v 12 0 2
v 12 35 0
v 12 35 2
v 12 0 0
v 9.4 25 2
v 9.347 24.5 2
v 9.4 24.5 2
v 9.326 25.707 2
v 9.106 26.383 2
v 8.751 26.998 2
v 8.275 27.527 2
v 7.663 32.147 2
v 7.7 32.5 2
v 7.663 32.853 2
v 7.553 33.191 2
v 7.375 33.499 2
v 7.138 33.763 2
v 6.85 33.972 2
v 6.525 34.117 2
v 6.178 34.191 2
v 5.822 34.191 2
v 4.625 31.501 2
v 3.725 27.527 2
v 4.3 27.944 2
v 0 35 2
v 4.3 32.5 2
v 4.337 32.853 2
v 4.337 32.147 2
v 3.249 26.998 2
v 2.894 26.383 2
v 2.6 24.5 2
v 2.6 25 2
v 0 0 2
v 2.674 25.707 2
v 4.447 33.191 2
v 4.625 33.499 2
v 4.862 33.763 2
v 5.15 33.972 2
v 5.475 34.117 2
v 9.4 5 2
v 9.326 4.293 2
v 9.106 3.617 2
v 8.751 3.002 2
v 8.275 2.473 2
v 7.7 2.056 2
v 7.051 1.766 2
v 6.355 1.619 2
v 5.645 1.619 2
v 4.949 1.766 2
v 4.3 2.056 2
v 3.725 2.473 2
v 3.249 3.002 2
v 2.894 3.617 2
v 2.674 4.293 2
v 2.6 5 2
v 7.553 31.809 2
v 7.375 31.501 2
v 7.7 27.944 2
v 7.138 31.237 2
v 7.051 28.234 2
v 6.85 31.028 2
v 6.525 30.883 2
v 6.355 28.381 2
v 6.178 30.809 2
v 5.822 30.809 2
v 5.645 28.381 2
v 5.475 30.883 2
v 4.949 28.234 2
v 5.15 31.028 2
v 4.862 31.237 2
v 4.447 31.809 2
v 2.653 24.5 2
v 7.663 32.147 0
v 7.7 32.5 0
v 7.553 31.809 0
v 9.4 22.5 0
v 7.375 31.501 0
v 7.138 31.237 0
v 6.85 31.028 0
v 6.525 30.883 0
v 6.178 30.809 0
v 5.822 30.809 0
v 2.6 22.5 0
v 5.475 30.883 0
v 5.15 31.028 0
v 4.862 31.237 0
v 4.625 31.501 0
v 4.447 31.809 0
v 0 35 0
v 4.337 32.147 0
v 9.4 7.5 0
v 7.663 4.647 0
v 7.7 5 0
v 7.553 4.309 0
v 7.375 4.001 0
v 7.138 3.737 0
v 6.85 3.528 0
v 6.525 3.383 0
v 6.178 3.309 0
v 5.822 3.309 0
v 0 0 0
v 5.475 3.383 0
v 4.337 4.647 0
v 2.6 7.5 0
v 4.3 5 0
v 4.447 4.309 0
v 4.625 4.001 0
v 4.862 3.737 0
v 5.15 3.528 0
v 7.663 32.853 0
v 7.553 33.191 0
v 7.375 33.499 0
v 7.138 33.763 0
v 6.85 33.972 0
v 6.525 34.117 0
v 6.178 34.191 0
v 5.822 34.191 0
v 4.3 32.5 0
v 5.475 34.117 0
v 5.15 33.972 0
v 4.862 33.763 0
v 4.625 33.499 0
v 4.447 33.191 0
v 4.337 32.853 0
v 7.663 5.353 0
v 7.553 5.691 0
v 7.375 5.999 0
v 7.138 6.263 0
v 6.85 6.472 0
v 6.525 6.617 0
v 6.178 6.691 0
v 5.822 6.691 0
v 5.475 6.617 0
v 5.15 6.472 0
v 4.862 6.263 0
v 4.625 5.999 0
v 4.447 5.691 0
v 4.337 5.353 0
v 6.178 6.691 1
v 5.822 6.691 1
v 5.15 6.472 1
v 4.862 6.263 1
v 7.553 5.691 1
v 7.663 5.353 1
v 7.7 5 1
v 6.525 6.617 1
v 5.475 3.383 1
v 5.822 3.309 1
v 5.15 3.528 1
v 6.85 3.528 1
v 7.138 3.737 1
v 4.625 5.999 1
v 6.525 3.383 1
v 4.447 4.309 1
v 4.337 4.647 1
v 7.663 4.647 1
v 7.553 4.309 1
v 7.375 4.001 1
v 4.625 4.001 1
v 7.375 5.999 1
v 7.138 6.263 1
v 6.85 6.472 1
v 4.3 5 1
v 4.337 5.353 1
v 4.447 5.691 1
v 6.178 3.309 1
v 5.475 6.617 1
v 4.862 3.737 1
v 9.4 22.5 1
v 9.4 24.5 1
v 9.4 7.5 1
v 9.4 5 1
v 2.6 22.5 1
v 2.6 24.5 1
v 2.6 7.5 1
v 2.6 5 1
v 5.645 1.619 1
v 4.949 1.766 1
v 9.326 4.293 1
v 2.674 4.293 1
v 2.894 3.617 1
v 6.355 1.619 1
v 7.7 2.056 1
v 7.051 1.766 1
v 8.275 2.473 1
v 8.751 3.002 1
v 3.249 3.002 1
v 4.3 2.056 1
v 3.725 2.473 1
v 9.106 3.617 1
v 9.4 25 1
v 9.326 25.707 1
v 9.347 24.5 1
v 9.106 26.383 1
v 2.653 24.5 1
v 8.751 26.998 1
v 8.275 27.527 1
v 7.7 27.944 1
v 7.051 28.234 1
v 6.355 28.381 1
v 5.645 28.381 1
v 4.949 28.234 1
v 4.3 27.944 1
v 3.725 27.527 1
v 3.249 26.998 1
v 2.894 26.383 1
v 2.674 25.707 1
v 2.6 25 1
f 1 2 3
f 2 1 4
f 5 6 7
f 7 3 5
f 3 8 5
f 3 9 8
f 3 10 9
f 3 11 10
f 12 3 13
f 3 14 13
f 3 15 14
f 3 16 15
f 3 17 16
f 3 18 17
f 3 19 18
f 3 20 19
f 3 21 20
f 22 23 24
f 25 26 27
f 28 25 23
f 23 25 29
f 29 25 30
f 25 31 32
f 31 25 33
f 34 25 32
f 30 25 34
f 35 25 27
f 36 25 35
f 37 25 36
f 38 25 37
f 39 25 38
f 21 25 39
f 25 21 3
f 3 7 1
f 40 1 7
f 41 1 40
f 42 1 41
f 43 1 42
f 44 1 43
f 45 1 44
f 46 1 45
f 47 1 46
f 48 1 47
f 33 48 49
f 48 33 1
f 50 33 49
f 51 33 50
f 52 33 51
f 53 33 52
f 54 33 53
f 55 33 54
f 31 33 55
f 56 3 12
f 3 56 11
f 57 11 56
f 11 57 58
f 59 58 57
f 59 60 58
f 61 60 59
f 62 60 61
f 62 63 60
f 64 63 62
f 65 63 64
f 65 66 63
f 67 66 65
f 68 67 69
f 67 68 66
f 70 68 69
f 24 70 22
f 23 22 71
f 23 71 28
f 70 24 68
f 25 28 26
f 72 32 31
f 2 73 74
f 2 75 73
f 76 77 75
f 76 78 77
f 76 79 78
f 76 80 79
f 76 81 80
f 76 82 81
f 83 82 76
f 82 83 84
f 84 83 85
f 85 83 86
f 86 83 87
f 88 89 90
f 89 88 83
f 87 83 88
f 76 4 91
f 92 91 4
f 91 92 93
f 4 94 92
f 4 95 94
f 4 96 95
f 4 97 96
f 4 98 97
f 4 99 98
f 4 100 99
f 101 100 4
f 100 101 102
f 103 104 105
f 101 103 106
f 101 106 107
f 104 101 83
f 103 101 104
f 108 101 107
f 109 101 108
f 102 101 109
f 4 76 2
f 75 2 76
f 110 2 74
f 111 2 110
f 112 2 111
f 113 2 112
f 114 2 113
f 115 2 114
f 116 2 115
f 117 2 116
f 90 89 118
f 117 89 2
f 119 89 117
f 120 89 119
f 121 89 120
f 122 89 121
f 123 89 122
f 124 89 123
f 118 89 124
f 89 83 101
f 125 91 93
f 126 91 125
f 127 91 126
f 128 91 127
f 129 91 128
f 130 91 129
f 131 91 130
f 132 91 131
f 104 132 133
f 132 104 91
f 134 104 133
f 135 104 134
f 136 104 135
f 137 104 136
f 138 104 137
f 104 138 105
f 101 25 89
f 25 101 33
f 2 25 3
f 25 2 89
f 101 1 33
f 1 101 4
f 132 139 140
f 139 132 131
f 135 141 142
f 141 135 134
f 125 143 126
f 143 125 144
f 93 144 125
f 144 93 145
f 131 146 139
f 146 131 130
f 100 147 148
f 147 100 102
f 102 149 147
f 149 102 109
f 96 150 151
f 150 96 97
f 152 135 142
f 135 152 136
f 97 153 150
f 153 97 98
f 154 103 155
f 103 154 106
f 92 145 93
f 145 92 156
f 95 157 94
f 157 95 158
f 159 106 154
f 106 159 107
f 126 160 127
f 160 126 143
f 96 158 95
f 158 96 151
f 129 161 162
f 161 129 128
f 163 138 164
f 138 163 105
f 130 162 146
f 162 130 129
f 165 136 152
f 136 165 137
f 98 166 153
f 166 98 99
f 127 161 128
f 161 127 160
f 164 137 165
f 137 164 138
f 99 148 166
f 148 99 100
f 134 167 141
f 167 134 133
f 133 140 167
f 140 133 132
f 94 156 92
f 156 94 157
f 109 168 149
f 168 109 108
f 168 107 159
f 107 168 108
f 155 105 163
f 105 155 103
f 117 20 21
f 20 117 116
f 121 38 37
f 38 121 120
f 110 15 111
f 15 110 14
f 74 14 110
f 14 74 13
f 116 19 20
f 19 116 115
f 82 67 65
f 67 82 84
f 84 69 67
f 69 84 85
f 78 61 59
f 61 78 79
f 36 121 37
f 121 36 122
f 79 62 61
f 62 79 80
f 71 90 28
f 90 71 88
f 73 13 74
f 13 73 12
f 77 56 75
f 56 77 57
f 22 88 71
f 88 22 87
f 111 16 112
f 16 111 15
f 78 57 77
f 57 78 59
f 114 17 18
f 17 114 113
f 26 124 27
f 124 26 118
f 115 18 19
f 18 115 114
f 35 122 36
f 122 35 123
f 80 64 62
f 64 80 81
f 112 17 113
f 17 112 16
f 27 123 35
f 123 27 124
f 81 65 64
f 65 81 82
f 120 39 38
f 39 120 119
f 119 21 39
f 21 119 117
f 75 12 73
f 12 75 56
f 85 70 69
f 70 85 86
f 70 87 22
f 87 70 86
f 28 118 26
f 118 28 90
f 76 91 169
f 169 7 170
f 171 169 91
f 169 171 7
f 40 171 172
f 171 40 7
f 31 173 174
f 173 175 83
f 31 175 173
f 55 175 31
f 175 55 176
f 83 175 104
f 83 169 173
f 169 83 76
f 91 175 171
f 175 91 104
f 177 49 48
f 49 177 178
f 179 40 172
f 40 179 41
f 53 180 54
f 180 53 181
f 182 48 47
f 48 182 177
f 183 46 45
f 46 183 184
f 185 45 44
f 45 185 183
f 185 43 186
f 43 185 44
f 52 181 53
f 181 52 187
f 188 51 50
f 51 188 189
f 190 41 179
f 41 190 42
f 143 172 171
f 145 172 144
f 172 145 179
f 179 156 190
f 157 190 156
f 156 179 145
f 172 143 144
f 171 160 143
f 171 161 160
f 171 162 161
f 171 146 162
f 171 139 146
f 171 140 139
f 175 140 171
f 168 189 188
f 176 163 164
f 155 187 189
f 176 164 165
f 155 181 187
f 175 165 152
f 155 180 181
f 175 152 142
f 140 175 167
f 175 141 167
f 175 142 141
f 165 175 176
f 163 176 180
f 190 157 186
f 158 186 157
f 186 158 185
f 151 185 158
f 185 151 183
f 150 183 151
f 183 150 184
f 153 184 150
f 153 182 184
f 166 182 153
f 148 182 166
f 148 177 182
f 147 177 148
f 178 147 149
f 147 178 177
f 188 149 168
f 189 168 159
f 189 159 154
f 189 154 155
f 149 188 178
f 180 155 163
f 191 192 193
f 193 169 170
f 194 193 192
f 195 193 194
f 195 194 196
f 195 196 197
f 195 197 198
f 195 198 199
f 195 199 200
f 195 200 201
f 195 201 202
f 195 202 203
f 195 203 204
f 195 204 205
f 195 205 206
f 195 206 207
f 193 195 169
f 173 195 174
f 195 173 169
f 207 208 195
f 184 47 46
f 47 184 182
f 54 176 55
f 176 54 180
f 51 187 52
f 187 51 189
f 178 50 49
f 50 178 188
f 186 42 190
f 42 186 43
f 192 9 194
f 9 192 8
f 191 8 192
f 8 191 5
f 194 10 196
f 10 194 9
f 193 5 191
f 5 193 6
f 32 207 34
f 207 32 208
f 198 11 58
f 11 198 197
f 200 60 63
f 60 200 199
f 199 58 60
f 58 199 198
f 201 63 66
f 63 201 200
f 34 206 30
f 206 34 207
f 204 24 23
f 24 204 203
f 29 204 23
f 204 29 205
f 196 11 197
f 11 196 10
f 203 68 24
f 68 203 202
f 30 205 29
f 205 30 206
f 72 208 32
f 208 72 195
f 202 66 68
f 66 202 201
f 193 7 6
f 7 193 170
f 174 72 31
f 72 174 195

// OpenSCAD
$fn=30;
width=12;
len=35; // total
holeDistFix = 27.5; // to body fix
holderOffset=5;
radius = 3.4; // hole radius

difference() {
    cube([width, len, 2]);

    translate([width/2,holderOffset,-1]) cylinder(r=1.7, h=12); // hole1
    translate([width/2,holderOffset+holeDistFix,-1]) cylinder(r=1.7, h=12); // hole to fix
    translate([width/2-radius,holderOffset+2.5,-1]) cube([radius*2,15,3]); // rect hole for the sensor

    // the carve out to hold the sensor
    translate([width/2,holderOffset,1]) cylinder(r=radius, h=8);
    translate([width/2,holderOffset+20,1]) cylinder(r=radius,h=8);
    translate([width/2-radius,holderOffset,1]) cube([radius*2,19.5,3]);    
}
